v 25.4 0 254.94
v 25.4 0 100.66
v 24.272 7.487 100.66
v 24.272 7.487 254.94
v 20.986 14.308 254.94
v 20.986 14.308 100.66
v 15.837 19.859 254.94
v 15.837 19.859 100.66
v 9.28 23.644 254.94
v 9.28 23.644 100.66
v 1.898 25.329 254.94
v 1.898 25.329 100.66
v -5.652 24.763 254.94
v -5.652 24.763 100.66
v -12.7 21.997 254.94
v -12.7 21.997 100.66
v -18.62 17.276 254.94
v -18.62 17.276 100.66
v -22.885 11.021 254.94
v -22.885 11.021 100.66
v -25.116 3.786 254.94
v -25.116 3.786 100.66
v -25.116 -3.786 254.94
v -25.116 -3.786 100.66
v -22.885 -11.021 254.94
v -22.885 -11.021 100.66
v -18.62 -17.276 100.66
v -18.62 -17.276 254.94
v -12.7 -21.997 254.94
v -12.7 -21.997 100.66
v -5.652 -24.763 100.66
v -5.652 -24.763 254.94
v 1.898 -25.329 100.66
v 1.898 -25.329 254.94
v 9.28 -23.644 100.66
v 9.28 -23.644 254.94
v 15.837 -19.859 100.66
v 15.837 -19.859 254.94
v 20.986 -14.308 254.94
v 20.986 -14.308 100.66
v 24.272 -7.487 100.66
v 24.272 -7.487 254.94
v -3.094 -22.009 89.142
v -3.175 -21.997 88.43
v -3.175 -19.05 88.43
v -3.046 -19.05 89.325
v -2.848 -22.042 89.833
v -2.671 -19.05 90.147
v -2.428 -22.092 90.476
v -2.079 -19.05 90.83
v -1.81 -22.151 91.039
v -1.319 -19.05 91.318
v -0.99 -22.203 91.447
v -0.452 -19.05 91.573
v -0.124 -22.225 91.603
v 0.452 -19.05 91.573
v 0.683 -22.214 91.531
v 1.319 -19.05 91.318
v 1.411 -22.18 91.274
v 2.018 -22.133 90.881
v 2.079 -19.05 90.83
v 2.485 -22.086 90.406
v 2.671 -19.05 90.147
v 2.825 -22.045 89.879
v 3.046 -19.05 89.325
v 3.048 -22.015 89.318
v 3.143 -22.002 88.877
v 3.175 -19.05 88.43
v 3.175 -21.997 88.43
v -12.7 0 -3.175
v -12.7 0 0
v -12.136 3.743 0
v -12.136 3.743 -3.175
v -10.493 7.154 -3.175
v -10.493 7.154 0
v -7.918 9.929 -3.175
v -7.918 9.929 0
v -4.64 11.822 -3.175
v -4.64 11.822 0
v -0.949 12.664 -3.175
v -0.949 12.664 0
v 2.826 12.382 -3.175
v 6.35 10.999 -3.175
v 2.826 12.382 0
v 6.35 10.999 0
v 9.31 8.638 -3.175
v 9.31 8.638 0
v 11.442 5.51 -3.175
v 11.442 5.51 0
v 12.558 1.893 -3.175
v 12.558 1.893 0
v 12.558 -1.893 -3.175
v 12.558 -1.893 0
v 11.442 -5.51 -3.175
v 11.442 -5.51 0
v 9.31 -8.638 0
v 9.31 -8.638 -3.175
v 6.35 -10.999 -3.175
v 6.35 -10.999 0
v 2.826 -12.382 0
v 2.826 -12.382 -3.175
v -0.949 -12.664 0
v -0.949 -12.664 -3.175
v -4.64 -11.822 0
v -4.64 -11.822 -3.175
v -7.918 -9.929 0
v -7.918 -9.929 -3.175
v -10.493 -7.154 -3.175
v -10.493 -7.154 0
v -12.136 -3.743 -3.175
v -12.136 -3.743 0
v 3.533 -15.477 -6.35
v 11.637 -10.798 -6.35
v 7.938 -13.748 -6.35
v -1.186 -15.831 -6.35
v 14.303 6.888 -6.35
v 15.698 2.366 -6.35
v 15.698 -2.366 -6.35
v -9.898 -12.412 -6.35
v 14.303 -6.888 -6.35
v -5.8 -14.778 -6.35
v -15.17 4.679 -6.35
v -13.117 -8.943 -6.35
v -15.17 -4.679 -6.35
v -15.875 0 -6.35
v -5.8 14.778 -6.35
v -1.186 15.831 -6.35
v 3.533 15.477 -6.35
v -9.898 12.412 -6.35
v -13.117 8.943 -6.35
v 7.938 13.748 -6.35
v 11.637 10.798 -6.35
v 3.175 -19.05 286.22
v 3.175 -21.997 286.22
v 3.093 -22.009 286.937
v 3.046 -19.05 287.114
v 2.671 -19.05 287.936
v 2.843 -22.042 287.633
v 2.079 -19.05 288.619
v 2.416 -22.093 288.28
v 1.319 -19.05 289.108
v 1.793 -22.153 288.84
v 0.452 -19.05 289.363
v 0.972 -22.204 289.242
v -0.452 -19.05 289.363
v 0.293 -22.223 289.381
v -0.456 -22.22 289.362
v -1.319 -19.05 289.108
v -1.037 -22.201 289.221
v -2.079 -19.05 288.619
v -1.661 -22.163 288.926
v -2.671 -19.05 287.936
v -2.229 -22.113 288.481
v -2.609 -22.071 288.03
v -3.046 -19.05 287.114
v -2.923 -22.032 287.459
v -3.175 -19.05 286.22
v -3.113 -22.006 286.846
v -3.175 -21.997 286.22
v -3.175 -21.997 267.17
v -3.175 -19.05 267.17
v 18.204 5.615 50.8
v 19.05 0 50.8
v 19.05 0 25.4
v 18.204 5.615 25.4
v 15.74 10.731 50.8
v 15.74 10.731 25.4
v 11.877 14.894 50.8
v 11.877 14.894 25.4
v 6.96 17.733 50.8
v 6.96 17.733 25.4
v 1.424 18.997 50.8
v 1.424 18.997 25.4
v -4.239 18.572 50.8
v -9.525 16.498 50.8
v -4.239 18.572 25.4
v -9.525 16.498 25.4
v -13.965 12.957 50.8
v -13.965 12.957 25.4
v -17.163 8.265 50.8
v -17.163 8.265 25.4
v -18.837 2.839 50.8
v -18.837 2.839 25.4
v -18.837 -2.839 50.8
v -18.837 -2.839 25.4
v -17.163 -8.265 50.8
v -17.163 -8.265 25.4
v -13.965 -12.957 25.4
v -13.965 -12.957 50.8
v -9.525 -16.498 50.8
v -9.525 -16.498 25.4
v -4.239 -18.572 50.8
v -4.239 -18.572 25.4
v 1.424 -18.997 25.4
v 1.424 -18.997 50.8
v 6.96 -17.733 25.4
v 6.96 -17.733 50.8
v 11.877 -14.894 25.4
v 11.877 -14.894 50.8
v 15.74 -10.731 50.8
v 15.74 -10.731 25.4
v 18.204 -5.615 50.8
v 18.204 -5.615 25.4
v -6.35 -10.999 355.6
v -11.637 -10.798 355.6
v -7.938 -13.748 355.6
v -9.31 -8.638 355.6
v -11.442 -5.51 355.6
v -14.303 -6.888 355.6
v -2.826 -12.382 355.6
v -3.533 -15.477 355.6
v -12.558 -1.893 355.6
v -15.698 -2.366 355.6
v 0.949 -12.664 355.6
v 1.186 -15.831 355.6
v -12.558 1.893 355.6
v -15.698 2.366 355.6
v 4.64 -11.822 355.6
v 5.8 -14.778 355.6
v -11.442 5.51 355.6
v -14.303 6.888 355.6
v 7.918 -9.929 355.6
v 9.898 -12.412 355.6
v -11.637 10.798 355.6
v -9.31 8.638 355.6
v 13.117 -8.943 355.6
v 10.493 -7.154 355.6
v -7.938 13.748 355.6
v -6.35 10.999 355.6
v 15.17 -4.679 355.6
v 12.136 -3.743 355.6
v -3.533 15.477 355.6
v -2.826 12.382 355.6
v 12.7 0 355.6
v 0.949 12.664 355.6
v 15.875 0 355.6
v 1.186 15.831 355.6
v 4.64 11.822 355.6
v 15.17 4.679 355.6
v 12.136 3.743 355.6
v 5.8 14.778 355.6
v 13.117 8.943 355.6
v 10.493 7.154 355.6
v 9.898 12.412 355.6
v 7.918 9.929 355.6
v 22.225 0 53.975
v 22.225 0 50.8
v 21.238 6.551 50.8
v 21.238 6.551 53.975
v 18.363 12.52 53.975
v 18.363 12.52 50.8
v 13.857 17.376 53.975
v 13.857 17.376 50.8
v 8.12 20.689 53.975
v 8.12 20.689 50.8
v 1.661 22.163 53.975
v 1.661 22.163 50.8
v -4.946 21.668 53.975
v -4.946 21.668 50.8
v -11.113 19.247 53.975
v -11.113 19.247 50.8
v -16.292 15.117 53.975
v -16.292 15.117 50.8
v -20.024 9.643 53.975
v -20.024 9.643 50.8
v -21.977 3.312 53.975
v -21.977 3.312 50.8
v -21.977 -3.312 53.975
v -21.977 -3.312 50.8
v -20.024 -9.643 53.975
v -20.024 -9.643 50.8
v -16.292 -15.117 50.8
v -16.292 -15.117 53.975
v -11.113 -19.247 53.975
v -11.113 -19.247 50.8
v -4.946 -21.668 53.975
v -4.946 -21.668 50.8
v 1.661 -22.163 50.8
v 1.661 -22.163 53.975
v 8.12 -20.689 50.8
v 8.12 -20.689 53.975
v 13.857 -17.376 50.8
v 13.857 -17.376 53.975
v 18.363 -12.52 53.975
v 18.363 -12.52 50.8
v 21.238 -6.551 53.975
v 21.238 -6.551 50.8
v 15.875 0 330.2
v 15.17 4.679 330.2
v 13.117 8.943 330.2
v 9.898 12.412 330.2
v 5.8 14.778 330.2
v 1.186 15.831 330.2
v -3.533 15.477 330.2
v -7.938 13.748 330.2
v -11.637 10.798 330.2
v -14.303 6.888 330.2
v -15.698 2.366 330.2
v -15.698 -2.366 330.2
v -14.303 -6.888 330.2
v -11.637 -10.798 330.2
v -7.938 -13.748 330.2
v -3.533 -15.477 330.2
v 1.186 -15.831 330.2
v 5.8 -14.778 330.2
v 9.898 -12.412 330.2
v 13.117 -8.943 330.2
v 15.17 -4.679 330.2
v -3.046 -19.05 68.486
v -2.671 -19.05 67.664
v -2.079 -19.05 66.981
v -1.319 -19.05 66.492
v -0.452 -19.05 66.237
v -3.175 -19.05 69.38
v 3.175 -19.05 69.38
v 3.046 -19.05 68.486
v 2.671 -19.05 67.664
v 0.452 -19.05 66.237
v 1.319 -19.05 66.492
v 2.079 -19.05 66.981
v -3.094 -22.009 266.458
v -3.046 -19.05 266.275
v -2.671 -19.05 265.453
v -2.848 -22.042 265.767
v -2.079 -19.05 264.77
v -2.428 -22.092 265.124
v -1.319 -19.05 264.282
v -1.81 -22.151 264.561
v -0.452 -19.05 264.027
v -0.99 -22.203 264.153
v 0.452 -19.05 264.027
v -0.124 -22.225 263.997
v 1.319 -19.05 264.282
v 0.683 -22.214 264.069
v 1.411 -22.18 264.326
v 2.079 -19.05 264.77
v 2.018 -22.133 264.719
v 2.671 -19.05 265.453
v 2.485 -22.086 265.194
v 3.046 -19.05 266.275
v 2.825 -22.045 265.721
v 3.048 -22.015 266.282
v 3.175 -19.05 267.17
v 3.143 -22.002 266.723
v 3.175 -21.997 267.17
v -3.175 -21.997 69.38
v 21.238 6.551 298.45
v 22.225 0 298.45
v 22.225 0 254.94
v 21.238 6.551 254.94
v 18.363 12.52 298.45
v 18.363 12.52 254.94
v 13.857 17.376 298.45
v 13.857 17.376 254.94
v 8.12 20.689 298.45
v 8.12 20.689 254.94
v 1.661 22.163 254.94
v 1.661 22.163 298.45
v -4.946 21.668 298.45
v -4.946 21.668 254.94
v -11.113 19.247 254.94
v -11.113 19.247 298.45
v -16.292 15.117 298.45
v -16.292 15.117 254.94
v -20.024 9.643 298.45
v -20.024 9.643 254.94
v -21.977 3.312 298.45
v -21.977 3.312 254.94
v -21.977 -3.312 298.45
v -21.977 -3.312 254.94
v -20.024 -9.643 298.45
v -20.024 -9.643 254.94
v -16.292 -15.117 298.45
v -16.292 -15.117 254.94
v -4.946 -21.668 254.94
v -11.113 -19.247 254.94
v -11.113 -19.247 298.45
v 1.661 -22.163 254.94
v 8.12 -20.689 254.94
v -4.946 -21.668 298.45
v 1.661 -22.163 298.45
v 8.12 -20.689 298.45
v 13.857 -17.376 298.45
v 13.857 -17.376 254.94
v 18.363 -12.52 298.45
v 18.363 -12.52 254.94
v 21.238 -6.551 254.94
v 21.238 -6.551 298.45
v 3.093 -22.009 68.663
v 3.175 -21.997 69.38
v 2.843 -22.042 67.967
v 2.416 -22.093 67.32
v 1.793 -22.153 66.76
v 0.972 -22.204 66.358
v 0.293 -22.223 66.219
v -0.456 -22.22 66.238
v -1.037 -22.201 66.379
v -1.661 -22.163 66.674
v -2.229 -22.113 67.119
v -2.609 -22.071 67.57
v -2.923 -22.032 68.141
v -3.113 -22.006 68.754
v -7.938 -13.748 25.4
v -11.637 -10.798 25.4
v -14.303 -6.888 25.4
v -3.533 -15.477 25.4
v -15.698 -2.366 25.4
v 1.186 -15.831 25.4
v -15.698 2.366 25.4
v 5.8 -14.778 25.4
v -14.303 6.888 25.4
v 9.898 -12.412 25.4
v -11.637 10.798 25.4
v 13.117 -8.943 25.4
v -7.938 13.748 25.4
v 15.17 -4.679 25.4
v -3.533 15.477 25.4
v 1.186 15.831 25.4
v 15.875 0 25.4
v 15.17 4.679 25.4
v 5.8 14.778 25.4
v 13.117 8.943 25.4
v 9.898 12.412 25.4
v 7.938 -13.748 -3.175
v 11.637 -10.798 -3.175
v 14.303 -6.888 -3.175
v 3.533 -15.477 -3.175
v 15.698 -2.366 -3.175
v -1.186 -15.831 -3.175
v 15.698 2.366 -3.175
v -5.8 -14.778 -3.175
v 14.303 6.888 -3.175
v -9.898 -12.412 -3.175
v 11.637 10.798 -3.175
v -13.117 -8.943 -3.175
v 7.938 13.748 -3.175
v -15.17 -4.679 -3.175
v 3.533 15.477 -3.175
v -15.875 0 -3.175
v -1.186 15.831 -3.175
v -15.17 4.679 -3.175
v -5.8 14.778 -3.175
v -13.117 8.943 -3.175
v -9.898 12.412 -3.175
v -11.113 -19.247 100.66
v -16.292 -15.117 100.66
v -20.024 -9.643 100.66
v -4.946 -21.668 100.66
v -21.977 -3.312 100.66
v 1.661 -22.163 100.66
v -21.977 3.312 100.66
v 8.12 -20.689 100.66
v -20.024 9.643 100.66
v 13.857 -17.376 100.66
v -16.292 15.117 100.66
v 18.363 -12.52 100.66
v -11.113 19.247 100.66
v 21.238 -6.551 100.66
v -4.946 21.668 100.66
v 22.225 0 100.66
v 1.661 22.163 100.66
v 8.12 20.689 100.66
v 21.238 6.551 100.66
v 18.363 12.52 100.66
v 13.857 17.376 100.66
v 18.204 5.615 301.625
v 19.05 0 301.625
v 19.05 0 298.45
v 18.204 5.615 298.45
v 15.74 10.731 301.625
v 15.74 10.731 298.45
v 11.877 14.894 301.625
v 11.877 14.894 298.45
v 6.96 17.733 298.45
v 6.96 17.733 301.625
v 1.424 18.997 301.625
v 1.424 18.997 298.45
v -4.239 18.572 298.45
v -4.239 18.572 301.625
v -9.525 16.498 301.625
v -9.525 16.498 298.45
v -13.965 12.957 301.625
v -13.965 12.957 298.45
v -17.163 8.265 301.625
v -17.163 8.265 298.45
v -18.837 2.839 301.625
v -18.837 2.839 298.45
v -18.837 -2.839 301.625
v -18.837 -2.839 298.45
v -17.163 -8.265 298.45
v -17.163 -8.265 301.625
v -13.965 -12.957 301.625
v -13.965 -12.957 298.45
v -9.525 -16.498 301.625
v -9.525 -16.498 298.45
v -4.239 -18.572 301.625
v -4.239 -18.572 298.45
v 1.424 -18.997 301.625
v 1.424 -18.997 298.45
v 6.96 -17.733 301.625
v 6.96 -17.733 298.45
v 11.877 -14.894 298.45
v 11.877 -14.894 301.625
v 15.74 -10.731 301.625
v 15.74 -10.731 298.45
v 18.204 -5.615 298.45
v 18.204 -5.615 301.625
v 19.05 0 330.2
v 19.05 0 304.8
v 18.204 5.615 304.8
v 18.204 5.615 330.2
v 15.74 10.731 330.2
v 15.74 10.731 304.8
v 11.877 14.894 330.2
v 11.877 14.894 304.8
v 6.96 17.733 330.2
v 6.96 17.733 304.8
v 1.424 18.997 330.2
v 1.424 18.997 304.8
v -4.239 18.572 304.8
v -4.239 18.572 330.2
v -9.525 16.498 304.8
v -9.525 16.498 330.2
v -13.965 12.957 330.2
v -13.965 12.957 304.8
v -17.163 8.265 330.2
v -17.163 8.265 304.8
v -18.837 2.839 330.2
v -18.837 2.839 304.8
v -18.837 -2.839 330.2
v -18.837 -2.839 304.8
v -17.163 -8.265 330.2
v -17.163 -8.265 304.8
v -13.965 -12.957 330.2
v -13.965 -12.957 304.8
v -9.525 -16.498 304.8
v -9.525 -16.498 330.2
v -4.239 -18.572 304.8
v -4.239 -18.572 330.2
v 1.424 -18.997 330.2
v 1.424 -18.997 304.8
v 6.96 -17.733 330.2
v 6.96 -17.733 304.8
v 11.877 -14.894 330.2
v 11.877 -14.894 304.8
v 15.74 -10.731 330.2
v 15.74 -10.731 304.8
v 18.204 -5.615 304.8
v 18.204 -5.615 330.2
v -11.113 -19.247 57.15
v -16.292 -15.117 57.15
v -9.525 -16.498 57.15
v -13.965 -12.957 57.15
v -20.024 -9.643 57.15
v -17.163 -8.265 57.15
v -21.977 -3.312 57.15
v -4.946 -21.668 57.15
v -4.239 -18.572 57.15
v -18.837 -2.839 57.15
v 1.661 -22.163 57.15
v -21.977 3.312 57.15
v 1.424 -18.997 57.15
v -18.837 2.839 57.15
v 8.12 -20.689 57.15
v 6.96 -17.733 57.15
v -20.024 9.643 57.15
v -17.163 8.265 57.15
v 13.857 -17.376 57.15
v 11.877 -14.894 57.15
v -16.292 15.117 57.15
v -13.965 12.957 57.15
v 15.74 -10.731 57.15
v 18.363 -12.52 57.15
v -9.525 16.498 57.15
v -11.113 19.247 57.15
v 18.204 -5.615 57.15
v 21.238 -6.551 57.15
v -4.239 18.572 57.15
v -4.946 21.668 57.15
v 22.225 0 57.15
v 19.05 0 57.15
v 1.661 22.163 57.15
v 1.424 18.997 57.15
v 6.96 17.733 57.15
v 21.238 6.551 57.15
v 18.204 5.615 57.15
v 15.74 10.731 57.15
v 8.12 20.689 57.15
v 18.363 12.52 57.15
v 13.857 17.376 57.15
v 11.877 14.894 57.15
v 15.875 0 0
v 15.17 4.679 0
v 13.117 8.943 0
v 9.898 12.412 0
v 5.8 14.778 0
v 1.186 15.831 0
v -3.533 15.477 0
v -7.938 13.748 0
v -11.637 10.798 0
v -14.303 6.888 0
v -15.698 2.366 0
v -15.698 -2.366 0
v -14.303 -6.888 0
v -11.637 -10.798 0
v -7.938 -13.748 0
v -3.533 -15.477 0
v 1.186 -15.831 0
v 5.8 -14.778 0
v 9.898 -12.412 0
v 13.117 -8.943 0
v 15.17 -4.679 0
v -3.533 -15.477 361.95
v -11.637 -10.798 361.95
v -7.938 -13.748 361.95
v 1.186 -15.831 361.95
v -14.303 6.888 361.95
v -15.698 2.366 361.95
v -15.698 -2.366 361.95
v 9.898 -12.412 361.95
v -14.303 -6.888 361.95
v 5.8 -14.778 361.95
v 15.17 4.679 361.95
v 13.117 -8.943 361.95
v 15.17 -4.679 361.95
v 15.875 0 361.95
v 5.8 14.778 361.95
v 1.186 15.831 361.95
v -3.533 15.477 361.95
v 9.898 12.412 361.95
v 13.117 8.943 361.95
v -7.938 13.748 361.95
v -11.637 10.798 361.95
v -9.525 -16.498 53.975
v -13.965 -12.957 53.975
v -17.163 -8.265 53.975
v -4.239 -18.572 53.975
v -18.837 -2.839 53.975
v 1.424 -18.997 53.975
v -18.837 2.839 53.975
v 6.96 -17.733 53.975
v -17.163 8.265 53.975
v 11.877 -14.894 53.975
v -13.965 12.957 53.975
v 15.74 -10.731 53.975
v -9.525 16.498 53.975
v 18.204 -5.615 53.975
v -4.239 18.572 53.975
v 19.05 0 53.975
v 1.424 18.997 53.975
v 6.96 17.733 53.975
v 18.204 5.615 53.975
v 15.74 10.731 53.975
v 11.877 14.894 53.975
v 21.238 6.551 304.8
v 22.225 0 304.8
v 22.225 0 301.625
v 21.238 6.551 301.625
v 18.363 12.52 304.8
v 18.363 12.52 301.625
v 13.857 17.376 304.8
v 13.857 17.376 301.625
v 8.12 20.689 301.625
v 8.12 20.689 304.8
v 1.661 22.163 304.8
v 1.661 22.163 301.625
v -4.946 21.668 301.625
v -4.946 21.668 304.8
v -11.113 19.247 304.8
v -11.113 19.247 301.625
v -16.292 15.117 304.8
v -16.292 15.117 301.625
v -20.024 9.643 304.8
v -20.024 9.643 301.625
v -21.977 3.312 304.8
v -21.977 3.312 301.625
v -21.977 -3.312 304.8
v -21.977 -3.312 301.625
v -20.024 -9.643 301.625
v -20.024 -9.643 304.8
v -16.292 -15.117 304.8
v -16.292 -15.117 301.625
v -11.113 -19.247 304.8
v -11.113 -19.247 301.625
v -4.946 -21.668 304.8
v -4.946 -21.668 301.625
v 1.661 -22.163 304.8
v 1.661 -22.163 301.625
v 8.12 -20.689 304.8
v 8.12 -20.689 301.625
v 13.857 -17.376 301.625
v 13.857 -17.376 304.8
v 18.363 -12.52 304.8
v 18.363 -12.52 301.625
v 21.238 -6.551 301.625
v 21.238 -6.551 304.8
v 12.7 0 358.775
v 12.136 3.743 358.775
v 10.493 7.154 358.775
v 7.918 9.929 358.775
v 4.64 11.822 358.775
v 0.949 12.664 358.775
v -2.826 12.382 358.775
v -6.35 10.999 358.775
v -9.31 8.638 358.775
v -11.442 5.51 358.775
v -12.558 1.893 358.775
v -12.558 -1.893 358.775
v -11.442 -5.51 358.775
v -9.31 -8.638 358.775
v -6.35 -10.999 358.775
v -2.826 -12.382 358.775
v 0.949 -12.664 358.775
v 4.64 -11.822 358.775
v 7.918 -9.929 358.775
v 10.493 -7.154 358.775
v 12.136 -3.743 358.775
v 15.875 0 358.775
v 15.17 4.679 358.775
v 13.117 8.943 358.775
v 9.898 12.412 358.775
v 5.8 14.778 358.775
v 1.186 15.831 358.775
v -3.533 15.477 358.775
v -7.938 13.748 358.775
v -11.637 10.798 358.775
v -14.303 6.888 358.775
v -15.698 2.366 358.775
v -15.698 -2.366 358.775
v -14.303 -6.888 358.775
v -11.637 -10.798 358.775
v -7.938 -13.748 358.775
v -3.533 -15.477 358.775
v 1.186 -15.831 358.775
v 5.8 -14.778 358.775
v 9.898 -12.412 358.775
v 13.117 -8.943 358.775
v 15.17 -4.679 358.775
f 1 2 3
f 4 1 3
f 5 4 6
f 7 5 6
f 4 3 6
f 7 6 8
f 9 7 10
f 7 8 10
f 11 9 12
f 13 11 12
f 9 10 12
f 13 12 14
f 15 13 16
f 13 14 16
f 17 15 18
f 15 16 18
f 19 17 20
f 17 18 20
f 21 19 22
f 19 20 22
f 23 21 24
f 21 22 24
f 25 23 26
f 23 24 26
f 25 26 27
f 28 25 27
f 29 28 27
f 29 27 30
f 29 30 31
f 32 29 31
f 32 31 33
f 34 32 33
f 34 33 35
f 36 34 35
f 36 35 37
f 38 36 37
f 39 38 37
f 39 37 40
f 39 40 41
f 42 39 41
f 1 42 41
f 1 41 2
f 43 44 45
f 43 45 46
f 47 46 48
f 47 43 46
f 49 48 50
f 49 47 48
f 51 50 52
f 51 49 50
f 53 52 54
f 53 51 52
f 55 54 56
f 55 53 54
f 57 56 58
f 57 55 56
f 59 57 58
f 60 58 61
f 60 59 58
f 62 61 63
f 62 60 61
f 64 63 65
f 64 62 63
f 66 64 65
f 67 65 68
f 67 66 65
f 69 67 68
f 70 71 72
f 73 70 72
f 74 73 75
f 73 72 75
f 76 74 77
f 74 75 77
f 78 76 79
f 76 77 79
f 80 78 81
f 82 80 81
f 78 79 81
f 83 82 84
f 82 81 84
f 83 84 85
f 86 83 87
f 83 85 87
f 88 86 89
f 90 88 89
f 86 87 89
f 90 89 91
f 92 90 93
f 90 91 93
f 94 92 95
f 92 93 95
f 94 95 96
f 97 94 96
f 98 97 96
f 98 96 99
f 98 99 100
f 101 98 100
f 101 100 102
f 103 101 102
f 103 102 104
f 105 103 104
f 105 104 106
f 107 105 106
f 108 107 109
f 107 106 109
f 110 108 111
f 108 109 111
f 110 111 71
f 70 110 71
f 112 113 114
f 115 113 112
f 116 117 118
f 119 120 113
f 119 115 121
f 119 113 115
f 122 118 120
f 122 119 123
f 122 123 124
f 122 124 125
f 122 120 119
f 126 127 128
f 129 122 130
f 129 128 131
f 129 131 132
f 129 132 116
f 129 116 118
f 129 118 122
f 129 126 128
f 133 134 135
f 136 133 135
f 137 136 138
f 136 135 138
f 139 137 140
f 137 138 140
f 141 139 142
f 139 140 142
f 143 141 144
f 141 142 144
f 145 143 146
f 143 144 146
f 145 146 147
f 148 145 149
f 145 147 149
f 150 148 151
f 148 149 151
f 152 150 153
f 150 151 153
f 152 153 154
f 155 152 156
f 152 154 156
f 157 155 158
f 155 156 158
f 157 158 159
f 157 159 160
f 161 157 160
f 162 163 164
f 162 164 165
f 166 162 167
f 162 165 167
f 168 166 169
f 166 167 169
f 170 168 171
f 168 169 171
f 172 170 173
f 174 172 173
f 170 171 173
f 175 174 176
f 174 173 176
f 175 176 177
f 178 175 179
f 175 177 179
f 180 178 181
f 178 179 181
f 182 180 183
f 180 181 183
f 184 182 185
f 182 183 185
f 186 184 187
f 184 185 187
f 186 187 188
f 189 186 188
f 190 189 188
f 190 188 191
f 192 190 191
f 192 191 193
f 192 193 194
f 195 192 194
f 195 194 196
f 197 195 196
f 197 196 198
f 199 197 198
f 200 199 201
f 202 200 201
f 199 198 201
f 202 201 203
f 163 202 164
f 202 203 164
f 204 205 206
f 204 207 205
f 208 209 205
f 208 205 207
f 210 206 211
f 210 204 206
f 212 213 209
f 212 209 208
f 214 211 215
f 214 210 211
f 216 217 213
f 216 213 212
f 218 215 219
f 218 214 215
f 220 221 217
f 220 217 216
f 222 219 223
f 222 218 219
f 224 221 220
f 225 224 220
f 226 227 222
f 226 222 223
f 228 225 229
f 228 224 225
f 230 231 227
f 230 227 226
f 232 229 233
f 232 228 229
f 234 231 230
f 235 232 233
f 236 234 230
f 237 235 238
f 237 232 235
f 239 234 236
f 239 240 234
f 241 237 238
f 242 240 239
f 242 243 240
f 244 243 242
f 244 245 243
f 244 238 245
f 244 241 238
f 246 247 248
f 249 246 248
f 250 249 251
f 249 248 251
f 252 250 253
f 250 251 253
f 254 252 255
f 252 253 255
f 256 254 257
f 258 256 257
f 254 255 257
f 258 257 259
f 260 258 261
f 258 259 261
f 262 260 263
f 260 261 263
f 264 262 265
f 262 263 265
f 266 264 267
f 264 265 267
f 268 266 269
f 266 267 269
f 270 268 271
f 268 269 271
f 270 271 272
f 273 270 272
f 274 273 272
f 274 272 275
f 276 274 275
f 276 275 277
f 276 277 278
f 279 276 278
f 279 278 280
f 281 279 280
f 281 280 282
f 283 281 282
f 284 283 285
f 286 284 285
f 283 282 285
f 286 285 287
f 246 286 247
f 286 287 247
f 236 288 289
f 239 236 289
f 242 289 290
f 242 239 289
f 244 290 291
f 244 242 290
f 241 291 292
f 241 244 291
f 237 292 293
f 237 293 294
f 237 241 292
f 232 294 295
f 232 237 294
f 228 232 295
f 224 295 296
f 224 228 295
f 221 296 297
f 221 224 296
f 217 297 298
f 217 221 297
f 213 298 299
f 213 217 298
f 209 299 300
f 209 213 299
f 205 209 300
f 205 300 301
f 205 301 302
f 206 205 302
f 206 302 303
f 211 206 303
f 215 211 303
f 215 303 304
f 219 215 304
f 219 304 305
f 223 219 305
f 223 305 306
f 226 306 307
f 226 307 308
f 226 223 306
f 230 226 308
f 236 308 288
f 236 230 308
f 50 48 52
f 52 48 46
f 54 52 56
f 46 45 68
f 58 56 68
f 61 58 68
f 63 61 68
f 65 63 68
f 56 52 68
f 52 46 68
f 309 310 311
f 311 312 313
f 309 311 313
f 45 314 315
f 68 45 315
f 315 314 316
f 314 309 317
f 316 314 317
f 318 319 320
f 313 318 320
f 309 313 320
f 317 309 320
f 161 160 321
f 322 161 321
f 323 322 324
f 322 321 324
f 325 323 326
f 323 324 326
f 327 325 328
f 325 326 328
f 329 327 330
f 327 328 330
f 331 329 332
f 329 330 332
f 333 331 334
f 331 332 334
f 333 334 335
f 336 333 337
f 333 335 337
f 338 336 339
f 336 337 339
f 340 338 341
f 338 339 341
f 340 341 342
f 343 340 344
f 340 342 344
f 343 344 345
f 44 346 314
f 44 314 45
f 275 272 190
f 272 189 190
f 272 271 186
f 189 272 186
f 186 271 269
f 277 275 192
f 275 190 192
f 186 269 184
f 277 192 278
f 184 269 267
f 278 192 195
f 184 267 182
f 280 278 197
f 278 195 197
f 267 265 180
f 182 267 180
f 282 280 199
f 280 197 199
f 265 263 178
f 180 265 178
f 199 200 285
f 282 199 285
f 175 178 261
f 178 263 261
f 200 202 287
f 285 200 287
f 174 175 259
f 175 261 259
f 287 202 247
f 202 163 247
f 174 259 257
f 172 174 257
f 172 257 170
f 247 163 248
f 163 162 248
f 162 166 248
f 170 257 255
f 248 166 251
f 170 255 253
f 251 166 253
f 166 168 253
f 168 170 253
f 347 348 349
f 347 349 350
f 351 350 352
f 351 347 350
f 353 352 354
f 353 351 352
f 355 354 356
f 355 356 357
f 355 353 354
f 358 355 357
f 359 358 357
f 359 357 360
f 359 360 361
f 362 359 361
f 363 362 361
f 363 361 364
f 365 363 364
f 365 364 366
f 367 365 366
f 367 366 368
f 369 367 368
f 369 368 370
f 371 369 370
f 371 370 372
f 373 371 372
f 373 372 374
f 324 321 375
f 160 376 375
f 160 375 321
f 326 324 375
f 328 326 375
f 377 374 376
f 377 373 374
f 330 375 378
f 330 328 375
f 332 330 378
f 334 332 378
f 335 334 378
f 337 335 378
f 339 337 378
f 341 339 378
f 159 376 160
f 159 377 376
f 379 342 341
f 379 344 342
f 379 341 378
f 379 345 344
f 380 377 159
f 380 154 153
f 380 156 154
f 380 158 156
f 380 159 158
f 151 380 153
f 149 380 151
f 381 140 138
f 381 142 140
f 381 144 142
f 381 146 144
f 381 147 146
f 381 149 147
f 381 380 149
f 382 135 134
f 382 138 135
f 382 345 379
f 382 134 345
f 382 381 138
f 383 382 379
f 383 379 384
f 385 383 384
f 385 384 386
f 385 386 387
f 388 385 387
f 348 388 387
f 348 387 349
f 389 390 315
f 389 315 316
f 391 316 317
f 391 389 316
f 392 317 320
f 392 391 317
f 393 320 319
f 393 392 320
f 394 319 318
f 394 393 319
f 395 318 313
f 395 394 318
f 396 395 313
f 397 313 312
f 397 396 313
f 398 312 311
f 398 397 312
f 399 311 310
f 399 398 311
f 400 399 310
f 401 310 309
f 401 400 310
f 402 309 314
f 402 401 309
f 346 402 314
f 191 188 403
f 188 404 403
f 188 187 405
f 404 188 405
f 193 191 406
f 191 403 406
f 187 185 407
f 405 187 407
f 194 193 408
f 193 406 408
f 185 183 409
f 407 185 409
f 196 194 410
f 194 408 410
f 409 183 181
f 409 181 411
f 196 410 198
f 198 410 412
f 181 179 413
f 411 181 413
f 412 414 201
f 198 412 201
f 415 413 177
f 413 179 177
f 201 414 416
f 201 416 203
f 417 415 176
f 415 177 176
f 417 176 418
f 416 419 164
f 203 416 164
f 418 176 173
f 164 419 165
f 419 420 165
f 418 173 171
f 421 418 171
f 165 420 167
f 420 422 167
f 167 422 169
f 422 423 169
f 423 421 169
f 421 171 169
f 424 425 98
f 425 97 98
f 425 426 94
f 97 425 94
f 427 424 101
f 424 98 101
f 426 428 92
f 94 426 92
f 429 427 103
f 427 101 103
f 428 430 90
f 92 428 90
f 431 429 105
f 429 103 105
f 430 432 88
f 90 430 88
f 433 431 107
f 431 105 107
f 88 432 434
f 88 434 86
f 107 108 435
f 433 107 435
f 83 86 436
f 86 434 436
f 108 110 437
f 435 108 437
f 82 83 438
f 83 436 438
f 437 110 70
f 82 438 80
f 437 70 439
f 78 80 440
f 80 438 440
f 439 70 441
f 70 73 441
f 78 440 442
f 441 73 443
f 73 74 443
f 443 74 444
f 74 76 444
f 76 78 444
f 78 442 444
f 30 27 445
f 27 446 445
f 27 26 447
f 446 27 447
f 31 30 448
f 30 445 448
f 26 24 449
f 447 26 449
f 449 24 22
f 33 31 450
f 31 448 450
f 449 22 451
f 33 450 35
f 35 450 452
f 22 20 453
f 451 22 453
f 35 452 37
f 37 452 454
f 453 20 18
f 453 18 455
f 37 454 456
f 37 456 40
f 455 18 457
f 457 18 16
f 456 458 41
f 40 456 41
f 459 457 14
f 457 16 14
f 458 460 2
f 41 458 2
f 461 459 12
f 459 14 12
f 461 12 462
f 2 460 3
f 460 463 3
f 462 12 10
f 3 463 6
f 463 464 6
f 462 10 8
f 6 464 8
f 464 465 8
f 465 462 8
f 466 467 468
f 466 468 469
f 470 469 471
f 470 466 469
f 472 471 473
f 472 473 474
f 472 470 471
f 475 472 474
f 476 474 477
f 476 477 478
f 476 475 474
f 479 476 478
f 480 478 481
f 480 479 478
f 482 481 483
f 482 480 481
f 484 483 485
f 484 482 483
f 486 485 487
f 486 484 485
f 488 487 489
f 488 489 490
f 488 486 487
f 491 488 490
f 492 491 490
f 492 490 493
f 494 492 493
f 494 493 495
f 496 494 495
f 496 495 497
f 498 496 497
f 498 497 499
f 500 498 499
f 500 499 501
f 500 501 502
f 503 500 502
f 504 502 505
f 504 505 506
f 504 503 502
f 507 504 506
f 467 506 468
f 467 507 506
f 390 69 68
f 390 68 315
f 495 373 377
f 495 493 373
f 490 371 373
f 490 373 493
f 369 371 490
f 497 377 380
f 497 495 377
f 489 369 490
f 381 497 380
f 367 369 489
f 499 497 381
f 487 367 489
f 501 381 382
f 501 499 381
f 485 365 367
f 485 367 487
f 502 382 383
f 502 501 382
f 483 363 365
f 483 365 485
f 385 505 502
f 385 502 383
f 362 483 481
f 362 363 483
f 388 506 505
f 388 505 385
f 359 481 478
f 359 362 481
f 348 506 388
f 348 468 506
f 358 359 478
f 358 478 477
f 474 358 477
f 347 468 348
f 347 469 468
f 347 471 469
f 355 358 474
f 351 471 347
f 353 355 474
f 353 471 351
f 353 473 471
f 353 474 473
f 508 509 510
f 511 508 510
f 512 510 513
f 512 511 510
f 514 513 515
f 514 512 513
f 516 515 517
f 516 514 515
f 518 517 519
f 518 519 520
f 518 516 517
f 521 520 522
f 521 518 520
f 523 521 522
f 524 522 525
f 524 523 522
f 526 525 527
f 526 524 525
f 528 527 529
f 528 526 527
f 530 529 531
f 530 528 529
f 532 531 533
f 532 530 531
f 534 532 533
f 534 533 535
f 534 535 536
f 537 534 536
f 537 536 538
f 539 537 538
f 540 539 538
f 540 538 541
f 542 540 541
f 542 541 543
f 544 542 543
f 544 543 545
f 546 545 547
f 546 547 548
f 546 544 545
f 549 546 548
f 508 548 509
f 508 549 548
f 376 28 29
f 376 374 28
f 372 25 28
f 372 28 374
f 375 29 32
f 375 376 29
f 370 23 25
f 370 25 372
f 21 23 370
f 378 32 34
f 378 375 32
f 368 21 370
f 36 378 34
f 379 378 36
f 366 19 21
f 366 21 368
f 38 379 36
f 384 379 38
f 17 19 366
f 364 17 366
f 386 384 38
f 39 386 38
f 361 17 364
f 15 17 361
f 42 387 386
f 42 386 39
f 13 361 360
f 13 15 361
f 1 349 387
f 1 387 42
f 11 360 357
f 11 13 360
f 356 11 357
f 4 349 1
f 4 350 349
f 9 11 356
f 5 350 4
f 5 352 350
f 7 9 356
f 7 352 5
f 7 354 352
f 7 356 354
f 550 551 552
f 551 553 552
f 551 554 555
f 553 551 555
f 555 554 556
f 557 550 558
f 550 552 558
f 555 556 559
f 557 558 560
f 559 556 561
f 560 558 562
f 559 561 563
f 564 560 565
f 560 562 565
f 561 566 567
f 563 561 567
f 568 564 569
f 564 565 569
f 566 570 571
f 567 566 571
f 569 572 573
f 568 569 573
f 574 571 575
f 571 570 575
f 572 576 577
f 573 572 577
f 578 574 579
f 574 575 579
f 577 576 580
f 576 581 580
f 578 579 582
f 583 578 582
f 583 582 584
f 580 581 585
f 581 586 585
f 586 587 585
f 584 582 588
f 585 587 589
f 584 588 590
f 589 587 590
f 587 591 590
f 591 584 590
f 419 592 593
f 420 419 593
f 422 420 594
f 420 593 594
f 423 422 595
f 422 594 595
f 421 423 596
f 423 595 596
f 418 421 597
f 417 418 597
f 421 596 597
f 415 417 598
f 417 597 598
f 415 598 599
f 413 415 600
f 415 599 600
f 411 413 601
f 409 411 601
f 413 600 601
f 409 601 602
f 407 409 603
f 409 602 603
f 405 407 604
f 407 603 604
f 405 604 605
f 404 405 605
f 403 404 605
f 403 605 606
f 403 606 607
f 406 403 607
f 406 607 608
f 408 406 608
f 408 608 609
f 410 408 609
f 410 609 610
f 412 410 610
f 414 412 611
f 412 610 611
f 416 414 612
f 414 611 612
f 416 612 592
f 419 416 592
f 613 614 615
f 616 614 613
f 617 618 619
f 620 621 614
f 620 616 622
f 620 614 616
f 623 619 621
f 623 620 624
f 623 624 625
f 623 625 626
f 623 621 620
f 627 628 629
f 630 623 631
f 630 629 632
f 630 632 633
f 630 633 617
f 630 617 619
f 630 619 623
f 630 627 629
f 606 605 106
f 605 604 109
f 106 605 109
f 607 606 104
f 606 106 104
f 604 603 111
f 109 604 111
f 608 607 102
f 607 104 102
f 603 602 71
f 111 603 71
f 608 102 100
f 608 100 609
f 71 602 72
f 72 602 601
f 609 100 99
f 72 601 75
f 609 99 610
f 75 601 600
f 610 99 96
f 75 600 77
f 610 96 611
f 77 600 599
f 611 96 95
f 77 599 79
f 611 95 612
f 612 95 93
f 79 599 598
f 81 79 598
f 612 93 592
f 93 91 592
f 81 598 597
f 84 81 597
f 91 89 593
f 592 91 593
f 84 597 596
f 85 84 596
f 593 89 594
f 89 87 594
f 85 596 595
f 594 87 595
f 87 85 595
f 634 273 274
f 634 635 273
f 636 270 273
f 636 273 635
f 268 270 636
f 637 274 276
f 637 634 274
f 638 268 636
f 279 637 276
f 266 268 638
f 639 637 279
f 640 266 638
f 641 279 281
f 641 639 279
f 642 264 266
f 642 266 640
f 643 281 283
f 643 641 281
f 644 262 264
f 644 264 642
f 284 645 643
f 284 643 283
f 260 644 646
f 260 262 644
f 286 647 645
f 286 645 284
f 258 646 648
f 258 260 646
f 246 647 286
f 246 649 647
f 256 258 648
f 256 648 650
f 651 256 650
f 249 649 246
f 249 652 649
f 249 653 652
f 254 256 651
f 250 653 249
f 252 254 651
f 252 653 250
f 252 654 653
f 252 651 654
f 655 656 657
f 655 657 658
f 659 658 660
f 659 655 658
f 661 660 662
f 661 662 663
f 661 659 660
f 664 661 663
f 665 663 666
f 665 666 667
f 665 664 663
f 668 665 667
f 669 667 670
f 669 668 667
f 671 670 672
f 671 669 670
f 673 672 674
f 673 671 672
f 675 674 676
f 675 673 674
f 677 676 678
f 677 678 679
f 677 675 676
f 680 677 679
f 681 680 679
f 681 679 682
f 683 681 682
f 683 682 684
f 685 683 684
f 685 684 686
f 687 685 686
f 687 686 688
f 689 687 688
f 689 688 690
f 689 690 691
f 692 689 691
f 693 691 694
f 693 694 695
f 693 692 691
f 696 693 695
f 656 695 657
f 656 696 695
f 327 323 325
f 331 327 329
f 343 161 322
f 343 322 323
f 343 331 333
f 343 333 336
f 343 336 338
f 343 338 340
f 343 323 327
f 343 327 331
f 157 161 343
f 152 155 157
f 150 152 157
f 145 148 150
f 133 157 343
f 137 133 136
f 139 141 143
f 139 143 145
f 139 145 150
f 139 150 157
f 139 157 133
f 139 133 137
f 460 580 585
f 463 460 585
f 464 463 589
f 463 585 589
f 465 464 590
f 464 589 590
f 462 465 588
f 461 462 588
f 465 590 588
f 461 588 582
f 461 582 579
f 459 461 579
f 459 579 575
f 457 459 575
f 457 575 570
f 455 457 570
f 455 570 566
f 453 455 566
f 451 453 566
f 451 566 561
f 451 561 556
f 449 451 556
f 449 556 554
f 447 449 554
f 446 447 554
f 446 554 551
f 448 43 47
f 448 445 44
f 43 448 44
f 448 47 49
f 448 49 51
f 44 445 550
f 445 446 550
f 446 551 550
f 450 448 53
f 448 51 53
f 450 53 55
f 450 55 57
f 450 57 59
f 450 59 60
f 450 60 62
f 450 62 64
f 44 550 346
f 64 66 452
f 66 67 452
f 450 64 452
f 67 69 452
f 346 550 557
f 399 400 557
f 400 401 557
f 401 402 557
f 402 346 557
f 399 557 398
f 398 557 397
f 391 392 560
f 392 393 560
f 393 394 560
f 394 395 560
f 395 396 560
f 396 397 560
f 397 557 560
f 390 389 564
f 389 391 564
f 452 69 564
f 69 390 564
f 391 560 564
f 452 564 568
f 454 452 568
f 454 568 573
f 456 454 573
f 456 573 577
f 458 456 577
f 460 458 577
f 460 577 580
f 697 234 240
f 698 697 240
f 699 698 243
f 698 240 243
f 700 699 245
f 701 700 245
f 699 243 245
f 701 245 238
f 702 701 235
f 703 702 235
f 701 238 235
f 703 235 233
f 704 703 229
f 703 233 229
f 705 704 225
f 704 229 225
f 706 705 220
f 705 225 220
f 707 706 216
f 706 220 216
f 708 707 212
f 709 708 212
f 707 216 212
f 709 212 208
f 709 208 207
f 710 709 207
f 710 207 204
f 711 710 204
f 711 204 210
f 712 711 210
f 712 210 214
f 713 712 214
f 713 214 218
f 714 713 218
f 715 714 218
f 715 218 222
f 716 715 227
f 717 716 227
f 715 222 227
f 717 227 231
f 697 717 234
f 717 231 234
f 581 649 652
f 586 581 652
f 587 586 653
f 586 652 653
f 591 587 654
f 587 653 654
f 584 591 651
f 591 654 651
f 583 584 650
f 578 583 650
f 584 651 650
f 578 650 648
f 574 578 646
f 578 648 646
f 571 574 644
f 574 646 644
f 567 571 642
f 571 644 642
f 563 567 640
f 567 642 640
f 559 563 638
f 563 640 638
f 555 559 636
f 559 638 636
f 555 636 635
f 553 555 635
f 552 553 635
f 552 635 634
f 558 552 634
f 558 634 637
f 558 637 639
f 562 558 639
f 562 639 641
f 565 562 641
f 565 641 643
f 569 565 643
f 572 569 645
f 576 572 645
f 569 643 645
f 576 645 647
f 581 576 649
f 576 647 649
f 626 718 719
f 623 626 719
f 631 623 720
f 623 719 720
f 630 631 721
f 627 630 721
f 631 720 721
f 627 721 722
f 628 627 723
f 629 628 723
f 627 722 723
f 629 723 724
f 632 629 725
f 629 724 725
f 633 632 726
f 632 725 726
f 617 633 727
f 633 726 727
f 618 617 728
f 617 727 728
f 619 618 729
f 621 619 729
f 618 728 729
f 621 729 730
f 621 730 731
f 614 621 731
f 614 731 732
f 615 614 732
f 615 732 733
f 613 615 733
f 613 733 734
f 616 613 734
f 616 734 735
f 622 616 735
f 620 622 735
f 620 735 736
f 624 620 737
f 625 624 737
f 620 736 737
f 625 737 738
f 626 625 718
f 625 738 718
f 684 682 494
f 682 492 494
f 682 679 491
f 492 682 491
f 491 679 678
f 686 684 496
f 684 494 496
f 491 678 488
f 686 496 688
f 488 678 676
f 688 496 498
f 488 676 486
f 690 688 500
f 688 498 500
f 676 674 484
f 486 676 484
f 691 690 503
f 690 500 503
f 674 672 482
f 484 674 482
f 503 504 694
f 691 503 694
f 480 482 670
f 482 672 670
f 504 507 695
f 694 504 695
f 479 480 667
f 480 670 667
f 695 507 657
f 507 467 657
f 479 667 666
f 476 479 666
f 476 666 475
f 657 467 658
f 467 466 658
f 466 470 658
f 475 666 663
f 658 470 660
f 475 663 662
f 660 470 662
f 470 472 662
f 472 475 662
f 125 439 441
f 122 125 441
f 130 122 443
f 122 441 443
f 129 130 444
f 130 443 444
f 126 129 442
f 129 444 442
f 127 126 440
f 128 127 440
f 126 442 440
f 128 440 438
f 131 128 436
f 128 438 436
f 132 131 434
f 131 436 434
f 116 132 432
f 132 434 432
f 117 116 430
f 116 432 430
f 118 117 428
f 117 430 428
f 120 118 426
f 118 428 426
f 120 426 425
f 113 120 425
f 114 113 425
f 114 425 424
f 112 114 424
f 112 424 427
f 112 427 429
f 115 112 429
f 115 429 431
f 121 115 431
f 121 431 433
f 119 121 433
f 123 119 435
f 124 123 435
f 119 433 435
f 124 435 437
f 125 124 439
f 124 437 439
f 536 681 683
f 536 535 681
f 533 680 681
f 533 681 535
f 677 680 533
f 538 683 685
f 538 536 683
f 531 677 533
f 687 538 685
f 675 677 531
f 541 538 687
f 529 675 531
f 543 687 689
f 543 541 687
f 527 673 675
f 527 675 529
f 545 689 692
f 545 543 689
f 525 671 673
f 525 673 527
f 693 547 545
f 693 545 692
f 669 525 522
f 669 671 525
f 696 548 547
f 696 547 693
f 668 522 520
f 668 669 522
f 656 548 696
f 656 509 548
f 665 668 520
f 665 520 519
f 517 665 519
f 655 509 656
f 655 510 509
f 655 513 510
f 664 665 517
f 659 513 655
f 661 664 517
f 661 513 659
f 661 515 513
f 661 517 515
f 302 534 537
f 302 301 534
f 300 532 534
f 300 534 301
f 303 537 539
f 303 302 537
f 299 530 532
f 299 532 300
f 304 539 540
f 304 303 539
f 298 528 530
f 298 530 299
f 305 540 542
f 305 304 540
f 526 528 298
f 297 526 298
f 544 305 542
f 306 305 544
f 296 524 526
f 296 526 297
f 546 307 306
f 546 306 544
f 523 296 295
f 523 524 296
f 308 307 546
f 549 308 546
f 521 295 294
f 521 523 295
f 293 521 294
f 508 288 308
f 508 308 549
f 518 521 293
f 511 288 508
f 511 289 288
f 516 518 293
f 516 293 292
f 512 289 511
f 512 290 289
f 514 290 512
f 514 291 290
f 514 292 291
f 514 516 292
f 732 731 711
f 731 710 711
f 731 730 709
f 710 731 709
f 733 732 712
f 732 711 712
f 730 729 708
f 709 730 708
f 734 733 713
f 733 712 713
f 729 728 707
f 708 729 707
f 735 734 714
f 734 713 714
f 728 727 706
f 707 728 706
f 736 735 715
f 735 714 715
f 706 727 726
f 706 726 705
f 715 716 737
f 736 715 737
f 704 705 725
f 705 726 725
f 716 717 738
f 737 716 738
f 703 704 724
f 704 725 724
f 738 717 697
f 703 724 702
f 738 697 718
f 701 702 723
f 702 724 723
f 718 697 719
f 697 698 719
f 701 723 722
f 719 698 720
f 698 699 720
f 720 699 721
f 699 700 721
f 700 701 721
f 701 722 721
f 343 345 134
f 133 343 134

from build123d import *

# Parameters (mm, degrees)
SKETCH2_R            = 15.875
BOSS_EXTRUDE1_DEPTH  = 25.4
SKETCH4_R            = 19.05
BOSS_EXTRUDE2_DEPTH  = 25.4
SKETCH5_R            = 22.225
BOSS_EXTRUDE3_DEPTH  = 3.175
SKETCH6_R            = 19.05
BOSS_EXTRUDE4_DEPTH  = 3.175
SKETCH7_R            = 22.225
BOSS_EXTRUDE5_DEPTH  = 43.5102
SKETCH8_R            = 25.4
BOSS_EXTRUDE6_DEPTH  = 77.1398
CUT_EXTRUDE1_DEPTH   = 3.175
SKETCH10_R           = 12.7
BOSS_EXTRUDE7_DEPTH  = 3.175
SKETCH11_R           = 15.875
BOSS_EXTRUDE8_DEPTH  = 3.175
SKETCH12_R           = 12.7
BOSS_EXTRUDE9_DEPTH  = 3.175
SKETCH13_R           = 15.875
BOSS_EXTRUDE10_DEPTH = 3.175


with BuildPart() as part:
    # Sketch2 → Boss-Extrude1 (new body)
    with BuildSketch(Plane.XY):
        Circle(SKETCH2_R)
    extrude(amount=BOSS_EXTRUDE1_DEPTH)

    # Sketch4 → Boss-Extrude2 (add)
    with BuildSketch(Plane.XY.offset(25.4)):
        Circle(SKETCH4_R)
    extrude(amount=BOSS_EXTRUDE2_DEPTH)

    # Sketch5 → Boss-Extrude3 (add)
    with BuildSketch(Plane.XY.offset(50.8)):
        Circle(SKETCH5_R)
    extrude(amount=BOSS_EXTRUDE3_DEPTH)

    # Sketch6 → Boss-Extrude4 (add)
    with BuildSketch(Plane.XY.offset(53.975)):
        Circle(SKETCH6_R)
    extrude(amount=BOSS_EXTRUDE4_DEPTH)

    # Sketch7 → Boss-Extrude5 (add)
    with BuildSketch(Plane.XY.offset(57.15)):
        Circle(SKETCH7_R)
    extrude(amount=BOSS_EXTRUDE5_DEPTH)

    # Sketch8 → Boss-Extrude6 (add)
    with BuildSketch(Plane.XY.offset(100.6602)):
        Circle(SKETCH8_R)
    extrude(amount=BOSS_EXTRUDE6_DEPTH)

    # Sketch9 → Cut-Extrude1 (cut)
    with BuildSketch(Plane(origin=(0, -22.225, 0), x_dir=(-1, 0, 0), z_dir=(0, -1, 0))):
        with BuildLine():
            Line((3.175, -69.3801), (3.175, -88.4301))
            ThreePointArc((3.175, -88.4301), (0, -91.6051), (-3.175, -88.4301))
            Line((-3.175, -88.4301), (-3.175, -69.3801))
            ThreePointArc((-3.175, -69.3801), (0, -66.2051), (3.175, -69.3801))
        make_face()
    extrude(amount=-CUT_EXTRUDE1_DEPTH, mode=Mode.SUBTRACT)

    # Mirror1: part across plane


with BuildPart() as part_1:
    add(part.part)
    add(part.part.mirror(Plane.XY.offset(177.8)))

    # Sketch10 → Boss-Extrude7 (add)
    with BuildSketch(Plane(origin=(0, 0, 0), x_dir=(-1, 0, 0), z_dir=(0, 0, -1))):
        Circle(SKETCH10_R)
    extrude(amount=BOSS_EXTRUDE7_DEPTH)

    # Sketch11 → Boss-Extrude8 (add)
    with BuildSketch(Plane(origin=(0, 0, -3.175), x_dir=(-1, 0, 0), z_dir=(0, 0, -1))):
        Circle(SKETCH11_R)
    extrude(amount=BOSS_EXTRUDE8_DEPTH)

    # Sketch12 → Boss-Extrude9 (add)
    with BuildSketch(Plane.XY.offset(355.6)):
        Circle(SKETCH12_R)
    extrude(amount=BOSS_EXTRUDE9_DEPTH)

    # Sketch13 → Boss-Extrude10 (add)
    with BuildSketch(Plane.XY.offset(358.775)):
        Circle(SKETCH13_R)
    extrude(amount=BOSS_EXTRUDE10_DEPTH)


solid = part_1.part
